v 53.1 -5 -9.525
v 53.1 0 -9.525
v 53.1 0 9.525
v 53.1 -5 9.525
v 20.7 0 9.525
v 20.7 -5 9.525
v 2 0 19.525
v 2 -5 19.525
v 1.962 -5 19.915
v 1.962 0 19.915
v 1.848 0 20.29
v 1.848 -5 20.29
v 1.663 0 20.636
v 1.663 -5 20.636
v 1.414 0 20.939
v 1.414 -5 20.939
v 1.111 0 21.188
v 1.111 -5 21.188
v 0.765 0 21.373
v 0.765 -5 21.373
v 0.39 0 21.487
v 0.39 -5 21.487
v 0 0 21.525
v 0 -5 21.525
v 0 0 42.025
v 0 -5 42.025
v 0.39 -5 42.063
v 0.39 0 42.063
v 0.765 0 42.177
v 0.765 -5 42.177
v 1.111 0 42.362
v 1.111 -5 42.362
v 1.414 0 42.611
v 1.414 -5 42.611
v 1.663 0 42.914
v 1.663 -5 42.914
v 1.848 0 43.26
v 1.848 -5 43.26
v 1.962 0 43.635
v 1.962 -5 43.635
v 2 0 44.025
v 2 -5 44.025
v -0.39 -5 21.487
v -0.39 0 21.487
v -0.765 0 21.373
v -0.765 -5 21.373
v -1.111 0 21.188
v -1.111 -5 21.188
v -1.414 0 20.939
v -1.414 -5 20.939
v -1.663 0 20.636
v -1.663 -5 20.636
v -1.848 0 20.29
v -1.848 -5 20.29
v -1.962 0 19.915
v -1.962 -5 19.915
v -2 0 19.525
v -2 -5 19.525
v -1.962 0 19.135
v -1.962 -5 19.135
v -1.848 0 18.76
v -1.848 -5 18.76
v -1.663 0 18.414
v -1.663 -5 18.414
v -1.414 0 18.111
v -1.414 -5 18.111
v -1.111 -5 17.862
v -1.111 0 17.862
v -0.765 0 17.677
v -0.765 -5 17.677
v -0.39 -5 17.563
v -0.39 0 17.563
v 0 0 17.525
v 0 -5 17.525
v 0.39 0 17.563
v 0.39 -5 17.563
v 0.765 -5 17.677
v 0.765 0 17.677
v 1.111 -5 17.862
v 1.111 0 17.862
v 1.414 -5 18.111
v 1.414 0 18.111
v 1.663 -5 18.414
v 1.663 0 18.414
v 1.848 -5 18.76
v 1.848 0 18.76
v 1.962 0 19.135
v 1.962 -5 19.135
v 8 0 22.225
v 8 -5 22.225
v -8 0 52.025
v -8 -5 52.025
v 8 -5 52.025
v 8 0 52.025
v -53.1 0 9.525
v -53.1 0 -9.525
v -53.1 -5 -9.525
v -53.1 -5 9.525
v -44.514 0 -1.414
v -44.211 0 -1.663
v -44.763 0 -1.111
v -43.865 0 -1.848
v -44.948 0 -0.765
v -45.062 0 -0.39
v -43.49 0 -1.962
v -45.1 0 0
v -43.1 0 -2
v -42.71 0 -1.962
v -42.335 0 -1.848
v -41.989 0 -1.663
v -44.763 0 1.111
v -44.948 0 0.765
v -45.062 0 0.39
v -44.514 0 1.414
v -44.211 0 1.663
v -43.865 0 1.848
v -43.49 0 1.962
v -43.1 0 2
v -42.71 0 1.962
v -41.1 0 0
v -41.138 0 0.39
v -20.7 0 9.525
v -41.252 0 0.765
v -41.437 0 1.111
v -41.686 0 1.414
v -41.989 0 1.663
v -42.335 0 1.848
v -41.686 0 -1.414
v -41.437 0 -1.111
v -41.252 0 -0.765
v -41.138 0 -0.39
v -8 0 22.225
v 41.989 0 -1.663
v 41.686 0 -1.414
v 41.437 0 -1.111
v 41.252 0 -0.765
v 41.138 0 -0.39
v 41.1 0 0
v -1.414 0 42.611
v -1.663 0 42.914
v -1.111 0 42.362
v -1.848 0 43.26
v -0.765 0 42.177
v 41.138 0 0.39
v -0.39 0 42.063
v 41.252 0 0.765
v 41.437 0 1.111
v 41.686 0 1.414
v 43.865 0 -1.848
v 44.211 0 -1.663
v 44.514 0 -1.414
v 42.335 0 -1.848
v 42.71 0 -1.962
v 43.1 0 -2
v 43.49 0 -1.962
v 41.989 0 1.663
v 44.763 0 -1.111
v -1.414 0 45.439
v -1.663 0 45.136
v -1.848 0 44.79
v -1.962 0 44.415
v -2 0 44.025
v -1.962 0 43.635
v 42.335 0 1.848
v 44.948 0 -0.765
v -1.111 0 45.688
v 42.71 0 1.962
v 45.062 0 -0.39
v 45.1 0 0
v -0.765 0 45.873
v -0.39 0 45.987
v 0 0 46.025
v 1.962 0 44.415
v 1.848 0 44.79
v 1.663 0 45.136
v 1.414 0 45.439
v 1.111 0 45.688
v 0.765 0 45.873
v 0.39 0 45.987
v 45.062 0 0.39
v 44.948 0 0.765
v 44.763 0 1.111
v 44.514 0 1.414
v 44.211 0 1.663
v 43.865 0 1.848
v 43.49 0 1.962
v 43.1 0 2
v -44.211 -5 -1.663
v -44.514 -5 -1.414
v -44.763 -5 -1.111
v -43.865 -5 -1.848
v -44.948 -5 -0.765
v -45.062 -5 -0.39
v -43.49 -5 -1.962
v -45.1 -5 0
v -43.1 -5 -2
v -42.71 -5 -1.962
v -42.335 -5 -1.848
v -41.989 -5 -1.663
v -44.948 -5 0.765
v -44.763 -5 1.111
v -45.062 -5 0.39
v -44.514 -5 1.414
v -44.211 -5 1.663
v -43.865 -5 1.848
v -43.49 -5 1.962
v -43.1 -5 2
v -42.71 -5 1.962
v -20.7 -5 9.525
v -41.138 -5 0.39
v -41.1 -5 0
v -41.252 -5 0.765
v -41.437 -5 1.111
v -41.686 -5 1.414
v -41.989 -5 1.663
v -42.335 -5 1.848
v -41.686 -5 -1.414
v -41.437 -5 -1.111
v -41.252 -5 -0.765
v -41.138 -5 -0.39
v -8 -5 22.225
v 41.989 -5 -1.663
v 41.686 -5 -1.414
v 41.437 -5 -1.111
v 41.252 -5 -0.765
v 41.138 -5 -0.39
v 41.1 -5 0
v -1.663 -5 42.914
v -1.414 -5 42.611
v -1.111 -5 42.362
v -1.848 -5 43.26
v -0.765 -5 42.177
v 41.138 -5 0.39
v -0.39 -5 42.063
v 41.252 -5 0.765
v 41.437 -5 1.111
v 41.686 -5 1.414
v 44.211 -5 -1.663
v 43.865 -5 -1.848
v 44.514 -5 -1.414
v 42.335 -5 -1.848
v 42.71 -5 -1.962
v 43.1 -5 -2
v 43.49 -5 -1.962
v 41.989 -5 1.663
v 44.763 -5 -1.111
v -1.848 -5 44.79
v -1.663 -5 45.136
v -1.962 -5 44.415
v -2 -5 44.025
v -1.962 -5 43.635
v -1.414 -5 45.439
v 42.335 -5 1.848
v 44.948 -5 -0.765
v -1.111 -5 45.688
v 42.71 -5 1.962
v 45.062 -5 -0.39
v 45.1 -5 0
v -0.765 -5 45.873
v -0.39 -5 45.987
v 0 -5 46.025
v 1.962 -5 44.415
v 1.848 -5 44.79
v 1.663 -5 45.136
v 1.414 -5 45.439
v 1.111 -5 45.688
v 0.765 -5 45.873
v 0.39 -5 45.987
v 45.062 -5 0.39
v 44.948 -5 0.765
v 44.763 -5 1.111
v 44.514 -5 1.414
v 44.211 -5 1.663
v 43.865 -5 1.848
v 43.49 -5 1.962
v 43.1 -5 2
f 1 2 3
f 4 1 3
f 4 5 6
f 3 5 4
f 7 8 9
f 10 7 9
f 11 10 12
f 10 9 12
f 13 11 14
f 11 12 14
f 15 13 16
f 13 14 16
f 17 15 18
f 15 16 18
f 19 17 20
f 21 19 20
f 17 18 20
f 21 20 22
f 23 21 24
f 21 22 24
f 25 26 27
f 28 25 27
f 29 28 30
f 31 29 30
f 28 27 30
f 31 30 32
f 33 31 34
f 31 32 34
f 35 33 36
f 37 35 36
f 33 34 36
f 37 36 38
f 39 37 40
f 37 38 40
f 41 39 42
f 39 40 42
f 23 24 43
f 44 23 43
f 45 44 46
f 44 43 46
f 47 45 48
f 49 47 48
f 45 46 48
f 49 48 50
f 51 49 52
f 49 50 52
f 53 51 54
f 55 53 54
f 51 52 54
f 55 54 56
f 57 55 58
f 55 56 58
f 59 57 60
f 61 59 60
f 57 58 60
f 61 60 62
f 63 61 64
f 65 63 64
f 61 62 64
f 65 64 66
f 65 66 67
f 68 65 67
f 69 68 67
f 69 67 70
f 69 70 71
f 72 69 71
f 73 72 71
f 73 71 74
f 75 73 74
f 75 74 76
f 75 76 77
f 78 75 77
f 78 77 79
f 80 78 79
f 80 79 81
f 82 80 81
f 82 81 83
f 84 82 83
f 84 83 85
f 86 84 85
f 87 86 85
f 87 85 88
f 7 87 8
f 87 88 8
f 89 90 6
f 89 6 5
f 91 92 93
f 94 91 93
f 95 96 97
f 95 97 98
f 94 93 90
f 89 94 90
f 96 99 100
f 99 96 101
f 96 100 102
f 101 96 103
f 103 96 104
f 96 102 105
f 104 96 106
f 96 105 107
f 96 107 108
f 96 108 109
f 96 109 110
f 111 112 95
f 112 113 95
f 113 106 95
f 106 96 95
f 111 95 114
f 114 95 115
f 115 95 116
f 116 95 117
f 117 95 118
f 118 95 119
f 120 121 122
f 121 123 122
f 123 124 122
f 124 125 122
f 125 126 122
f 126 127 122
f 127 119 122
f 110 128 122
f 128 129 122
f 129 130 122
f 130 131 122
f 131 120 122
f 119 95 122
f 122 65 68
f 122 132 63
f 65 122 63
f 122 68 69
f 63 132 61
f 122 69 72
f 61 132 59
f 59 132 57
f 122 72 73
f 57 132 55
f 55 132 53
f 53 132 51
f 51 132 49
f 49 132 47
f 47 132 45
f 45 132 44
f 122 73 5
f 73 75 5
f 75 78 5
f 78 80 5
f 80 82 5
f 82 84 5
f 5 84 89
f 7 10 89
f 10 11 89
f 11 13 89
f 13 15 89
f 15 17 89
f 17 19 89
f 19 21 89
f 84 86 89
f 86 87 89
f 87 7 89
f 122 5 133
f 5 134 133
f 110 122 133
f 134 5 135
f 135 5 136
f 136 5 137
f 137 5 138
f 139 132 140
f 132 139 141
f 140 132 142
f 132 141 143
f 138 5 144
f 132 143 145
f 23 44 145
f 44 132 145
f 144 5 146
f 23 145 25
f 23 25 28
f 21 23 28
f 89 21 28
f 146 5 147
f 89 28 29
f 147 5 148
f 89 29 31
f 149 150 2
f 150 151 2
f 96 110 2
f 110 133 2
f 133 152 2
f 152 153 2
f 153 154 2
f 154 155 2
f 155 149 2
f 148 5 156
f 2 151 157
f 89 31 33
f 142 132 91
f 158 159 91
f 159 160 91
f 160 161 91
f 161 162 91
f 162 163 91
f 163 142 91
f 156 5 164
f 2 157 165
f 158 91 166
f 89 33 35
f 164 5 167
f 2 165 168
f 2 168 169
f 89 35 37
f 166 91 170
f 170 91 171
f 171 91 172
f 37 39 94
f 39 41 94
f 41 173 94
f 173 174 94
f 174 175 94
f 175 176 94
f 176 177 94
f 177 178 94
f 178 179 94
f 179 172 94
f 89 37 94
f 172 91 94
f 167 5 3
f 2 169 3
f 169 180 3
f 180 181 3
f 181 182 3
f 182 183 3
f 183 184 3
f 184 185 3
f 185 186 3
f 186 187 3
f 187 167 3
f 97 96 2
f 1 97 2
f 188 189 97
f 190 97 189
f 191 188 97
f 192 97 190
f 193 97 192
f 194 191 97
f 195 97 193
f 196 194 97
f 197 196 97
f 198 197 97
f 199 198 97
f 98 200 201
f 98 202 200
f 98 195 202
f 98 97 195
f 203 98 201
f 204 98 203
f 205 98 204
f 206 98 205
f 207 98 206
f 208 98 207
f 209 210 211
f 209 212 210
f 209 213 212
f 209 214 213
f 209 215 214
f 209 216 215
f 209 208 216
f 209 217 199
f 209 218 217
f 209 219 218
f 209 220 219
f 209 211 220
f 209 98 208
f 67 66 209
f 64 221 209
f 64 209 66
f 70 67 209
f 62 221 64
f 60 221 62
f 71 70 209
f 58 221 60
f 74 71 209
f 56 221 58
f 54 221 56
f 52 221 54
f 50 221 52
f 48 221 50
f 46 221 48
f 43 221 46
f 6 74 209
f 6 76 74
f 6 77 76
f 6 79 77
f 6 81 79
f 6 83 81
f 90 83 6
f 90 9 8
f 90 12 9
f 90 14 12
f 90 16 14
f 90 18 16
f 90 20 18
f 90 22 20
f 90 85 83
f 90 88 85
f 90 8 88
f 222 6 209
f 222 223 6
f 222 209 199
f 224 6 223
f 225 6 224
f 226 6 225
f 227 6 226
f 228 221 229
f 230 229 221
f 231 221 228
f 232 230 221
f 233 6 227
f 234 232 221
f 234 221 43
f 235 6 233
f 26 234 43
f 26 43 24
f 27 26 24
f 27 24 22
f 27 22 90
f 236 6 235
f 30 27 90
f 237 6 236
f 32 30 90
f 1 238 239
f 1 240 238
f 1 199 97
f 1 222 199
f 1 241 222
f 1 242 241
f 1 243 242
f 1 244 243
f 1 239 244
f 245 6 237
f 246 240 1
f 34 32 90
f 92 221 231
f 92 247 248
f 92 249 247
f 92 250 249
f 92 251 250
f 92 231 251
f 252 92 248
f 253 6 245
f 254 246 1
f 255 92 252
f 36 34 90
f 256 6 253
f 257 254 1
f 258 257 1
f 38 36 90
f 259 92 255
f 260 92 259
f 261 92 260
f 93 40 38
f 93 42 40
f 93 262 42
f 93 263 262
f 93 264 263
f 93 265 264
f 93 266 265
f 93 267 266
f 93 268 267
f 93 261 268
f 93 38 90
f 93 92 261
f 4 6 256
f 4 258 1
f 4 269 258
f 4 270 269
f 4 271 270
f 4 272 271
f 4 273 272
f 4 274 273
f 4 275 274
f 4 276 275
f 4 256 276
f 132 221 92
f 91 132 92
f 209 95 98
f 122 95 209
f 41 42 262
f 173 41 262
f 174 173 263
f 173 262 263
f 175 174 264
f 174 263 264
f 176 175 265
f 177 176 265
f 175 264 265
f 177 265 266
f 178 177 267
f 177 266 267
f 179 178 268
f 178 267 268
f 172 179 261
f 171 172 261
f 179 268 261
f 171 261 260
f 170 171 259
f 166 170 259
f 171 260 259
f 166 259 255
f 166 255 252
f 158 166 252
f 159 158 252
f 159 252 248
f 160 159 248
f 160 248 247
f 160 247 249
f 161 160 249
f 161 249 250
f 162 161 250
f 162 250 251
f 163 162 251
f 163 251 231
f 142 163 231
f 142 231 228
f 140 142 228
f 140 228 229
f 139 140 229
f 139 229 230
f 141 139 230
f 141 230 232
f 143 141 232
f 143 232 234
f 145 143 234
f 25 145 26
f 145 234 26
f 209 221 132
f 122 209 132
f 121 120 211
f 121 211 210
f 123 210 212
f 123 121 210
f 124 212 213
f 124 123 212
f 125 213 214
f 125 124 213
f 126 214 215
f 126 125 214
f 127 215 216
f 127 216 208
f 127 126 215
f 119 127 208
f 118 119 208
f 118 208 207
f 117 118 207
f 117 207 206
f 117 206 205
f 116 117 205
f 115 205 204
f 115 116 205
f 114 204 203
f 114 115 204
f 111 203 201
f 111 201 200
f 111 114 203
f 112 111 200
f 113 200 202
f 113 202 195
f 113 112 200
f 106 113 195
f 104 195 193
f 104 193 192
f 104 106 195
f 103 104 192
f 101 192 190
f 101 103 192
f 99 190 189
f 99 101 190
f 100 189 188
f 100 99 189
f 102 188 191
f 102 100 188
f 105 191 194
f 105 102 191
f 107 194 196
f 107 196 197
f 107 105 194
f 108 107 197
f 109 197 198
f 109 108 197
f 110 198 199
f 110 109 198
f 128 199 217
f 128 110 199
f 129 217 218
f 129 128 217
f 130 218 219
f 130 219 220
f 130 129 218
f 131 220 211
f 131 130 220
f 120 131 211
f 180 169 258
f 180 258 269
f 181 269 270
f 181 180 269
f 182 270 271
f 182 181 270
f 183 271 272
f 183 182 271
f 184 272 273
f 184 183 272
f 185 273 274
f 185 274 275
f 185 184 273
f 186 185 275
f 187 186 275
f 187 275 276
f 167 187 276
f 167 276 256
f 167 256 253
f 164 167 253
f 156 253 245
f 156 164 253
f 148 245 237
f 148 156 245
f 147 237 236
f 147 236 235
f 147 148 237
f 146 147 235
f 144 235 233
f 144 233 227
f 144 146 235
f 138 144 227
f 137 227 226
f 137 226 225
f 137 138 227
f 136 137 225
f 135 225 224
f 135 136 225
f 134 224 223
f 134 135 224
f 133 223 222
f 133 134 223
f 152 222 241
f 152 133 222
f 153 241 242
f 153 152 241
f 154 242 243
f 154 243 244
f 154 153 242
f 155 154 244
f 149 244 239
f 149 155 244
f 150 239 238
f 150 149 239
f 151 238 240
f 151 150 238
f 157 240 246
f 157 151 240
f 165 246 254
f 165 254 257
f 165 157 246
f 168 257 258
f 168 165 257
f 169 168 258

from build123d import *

# Parameters (mm, degrees)
F0_W     = 38.1
F0_H     = 19.05
F0_R     = 2
F0_W_2   = 30
F0_H_2   = 53.175
F1_DEPTH = 5
F2_SIZE  = 19.05
F4_DEPTH = 5.001
F5_DEPTH = 25.4
F6_SIZE  = 12.7


with BuildPart() as f1:
    # F0 (on Front) → F1 (new body)
    with BuildSketch(Plane.XZ):
        with Locations((34.05, 0)):
            Rectangle(F0_W, F0_H)
        with Locations((43.1, 0)):
            Circle(F0_R, mode=Mode.SUBTRACT)
        with Locations((0, 36.1125)):
            Rectangle(F0_W_2, F0_H_2)
        with Locations((-34.05, 0)):
            Rectangle(F0_W, F0_H)
        with Locations((-43.1, 0)):
            Circle(F0_R, mode=Mode.SUBTRACT)
        Rectangle(F0_W_2, F0_H)
    extrude(amount=F1_DEPTH)

    # F2
    f2_edges = [f1.edges().sort_by_distance(p)[0] for p in [
        (15, -2.5, 9.525),
        (-15, -2.5, 9.525),
    ]]
    chamfer(f2_edges, length=F2_SIZE)

    # F3 (on face) → F4 (cut, through all)
    with BuildSketch(Plane.XZ.offset(5)):
        Polygon((-8, 52.025), (8, 52.025), (8, 11.525), (8, 9.525), (34.05, 9.525), (15, 28.575), (15, 62.7), (-15, 62.7), (-15, 28.575), (-34.05, 9.525), (-8, 9.525), (-8, 11.525), align=None)
    extrude(amount=-F4_DEPTH, mode=Mode.SUBTRACT)

    # F3 (on face) → F5 (cut)
    with BuildSketch(Plane.XZ.offset(5)):
        with BuildLine():
            ThreePointArc((0, 42.025), (1.4142135624, 42.6107864376), (2, 44.025))
            ThreePointArc((2, 44.025), (-1.4142135624, 45.4392135624), (0, 42.025))
        make_face()
        with BuildLine():
            ThreePointArc((2, 19.525), (1.4142135624, 20.9392135624), (0, 21.525))
            ThreePointArc((0, 21.525), (-1.4142135624, 18.1107864376), (2, 19.525))
        make_face()
    extrude(amount=-F5_DEPTH, mode=Mode.SUBTRACT)

    # F6
    f6_edges = [f1.edges().sort_by_distance(p)[0] for p in [
        (8, -2.5, 9.525),
        (-8, -2.5, 9.525),
    ]]
    chamfer(f6_edges, length=F6_SIZE)


solid = f1.part
